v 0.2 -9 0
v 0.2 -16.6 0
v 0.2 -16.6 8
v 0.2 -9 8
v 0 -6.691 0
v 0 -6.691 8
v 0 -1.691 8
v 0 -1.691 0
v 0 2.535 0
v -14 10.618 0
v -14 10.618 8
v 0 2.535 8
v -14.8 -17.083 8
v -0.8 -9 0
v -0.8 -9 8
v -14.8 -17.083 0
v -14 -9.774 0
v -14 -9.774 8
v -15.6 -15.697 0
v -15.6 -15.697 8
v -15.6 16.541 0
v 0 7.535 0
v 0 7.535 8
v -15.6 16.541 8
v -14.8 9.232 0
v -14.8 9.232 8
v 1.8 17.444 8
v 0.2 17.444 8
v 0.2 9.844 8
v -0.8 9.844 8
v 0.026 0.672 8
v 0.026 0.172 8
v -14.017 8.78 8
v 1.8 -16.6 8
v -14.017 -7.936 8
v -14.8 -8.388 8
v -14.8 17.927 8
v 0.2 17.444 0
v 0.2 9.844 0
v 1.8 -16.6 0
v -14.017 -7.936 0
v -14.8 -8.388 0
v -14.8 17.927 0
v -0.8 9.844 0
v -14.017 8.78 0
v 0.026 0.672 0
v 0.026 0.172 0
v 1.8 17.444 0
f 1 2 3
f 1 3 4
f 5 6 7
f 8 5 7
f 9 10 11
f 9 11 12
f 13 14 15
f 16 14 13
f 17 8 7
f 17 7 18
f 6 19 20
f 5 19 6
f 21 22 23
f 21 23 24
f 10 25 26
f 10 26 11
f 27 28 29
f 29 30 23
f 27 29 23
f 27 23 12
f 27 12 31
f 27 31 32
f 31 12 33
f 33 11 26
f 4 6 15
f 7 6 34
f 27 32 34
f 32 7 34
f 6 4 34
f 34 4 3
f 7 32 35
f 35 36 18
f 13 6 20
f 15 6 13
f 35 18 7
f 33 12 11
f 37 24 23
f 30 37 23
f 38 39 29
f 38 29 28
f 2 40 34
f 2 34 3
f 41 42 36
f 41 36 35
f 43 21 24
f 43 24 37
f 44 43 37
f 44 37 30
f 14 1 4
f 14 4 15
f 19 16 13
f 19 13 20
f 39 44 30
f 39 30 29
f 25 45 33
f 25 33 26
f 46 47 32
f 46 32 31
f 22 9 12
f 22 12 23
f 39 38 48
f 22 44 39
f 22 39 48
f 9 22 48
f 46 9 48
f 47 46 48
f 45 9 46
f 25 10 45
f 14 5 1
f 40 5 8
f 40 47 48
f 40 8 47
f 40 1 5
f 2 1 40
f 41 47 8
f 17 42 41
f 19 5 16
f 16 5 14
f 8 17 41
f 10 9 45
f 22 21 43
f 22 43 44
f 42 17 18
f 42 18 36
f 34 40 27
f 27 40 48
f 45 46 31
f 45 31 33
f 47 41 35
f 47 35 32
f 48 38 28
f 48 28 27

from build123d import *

# Parameters (mm, degrees)
BOSS_EXTRUDE1_DEPTH = 8


with BuildPart() as part:
    # Sketch1 → Boss-Extrude1 (new body)
    with BuildSketch(Plane(origin=(0, 0, 0), x_dir=(0, 1, 0), z_dir=(0, 0, 1))):
        Polygon((-16.6, -1.8), (-16.6, -0.2), (-9, -0.2), (-9, 0.8), (-17.082903769, 14.8), (-15.697263123, 15.6), (-6.690598923, 0), (-1.690598923, 0), (-9.773502692, 14), (-8.387862046, 14.8), (-7.935720847, 14.016868471), (0.172032948, -0.026173037), (0.672032948, -0.026173037), (8.779786743, 14.016868471), (9.231927942, 14.8), (10.617568588, 14), (2.534664819, 0), (7.534664819, 0), (16.541329018, 15.6), (17.926969664, 14.8), (9.844065896, 0.8), (9.844065896, -0.2), (17.444065896, -0.2), (17.444065896, -1.8), (0.422032948, -1.8), align=None)
    extrude(amount=BOSS_EXTRUDE1_DEPTH)


solid = part.part
